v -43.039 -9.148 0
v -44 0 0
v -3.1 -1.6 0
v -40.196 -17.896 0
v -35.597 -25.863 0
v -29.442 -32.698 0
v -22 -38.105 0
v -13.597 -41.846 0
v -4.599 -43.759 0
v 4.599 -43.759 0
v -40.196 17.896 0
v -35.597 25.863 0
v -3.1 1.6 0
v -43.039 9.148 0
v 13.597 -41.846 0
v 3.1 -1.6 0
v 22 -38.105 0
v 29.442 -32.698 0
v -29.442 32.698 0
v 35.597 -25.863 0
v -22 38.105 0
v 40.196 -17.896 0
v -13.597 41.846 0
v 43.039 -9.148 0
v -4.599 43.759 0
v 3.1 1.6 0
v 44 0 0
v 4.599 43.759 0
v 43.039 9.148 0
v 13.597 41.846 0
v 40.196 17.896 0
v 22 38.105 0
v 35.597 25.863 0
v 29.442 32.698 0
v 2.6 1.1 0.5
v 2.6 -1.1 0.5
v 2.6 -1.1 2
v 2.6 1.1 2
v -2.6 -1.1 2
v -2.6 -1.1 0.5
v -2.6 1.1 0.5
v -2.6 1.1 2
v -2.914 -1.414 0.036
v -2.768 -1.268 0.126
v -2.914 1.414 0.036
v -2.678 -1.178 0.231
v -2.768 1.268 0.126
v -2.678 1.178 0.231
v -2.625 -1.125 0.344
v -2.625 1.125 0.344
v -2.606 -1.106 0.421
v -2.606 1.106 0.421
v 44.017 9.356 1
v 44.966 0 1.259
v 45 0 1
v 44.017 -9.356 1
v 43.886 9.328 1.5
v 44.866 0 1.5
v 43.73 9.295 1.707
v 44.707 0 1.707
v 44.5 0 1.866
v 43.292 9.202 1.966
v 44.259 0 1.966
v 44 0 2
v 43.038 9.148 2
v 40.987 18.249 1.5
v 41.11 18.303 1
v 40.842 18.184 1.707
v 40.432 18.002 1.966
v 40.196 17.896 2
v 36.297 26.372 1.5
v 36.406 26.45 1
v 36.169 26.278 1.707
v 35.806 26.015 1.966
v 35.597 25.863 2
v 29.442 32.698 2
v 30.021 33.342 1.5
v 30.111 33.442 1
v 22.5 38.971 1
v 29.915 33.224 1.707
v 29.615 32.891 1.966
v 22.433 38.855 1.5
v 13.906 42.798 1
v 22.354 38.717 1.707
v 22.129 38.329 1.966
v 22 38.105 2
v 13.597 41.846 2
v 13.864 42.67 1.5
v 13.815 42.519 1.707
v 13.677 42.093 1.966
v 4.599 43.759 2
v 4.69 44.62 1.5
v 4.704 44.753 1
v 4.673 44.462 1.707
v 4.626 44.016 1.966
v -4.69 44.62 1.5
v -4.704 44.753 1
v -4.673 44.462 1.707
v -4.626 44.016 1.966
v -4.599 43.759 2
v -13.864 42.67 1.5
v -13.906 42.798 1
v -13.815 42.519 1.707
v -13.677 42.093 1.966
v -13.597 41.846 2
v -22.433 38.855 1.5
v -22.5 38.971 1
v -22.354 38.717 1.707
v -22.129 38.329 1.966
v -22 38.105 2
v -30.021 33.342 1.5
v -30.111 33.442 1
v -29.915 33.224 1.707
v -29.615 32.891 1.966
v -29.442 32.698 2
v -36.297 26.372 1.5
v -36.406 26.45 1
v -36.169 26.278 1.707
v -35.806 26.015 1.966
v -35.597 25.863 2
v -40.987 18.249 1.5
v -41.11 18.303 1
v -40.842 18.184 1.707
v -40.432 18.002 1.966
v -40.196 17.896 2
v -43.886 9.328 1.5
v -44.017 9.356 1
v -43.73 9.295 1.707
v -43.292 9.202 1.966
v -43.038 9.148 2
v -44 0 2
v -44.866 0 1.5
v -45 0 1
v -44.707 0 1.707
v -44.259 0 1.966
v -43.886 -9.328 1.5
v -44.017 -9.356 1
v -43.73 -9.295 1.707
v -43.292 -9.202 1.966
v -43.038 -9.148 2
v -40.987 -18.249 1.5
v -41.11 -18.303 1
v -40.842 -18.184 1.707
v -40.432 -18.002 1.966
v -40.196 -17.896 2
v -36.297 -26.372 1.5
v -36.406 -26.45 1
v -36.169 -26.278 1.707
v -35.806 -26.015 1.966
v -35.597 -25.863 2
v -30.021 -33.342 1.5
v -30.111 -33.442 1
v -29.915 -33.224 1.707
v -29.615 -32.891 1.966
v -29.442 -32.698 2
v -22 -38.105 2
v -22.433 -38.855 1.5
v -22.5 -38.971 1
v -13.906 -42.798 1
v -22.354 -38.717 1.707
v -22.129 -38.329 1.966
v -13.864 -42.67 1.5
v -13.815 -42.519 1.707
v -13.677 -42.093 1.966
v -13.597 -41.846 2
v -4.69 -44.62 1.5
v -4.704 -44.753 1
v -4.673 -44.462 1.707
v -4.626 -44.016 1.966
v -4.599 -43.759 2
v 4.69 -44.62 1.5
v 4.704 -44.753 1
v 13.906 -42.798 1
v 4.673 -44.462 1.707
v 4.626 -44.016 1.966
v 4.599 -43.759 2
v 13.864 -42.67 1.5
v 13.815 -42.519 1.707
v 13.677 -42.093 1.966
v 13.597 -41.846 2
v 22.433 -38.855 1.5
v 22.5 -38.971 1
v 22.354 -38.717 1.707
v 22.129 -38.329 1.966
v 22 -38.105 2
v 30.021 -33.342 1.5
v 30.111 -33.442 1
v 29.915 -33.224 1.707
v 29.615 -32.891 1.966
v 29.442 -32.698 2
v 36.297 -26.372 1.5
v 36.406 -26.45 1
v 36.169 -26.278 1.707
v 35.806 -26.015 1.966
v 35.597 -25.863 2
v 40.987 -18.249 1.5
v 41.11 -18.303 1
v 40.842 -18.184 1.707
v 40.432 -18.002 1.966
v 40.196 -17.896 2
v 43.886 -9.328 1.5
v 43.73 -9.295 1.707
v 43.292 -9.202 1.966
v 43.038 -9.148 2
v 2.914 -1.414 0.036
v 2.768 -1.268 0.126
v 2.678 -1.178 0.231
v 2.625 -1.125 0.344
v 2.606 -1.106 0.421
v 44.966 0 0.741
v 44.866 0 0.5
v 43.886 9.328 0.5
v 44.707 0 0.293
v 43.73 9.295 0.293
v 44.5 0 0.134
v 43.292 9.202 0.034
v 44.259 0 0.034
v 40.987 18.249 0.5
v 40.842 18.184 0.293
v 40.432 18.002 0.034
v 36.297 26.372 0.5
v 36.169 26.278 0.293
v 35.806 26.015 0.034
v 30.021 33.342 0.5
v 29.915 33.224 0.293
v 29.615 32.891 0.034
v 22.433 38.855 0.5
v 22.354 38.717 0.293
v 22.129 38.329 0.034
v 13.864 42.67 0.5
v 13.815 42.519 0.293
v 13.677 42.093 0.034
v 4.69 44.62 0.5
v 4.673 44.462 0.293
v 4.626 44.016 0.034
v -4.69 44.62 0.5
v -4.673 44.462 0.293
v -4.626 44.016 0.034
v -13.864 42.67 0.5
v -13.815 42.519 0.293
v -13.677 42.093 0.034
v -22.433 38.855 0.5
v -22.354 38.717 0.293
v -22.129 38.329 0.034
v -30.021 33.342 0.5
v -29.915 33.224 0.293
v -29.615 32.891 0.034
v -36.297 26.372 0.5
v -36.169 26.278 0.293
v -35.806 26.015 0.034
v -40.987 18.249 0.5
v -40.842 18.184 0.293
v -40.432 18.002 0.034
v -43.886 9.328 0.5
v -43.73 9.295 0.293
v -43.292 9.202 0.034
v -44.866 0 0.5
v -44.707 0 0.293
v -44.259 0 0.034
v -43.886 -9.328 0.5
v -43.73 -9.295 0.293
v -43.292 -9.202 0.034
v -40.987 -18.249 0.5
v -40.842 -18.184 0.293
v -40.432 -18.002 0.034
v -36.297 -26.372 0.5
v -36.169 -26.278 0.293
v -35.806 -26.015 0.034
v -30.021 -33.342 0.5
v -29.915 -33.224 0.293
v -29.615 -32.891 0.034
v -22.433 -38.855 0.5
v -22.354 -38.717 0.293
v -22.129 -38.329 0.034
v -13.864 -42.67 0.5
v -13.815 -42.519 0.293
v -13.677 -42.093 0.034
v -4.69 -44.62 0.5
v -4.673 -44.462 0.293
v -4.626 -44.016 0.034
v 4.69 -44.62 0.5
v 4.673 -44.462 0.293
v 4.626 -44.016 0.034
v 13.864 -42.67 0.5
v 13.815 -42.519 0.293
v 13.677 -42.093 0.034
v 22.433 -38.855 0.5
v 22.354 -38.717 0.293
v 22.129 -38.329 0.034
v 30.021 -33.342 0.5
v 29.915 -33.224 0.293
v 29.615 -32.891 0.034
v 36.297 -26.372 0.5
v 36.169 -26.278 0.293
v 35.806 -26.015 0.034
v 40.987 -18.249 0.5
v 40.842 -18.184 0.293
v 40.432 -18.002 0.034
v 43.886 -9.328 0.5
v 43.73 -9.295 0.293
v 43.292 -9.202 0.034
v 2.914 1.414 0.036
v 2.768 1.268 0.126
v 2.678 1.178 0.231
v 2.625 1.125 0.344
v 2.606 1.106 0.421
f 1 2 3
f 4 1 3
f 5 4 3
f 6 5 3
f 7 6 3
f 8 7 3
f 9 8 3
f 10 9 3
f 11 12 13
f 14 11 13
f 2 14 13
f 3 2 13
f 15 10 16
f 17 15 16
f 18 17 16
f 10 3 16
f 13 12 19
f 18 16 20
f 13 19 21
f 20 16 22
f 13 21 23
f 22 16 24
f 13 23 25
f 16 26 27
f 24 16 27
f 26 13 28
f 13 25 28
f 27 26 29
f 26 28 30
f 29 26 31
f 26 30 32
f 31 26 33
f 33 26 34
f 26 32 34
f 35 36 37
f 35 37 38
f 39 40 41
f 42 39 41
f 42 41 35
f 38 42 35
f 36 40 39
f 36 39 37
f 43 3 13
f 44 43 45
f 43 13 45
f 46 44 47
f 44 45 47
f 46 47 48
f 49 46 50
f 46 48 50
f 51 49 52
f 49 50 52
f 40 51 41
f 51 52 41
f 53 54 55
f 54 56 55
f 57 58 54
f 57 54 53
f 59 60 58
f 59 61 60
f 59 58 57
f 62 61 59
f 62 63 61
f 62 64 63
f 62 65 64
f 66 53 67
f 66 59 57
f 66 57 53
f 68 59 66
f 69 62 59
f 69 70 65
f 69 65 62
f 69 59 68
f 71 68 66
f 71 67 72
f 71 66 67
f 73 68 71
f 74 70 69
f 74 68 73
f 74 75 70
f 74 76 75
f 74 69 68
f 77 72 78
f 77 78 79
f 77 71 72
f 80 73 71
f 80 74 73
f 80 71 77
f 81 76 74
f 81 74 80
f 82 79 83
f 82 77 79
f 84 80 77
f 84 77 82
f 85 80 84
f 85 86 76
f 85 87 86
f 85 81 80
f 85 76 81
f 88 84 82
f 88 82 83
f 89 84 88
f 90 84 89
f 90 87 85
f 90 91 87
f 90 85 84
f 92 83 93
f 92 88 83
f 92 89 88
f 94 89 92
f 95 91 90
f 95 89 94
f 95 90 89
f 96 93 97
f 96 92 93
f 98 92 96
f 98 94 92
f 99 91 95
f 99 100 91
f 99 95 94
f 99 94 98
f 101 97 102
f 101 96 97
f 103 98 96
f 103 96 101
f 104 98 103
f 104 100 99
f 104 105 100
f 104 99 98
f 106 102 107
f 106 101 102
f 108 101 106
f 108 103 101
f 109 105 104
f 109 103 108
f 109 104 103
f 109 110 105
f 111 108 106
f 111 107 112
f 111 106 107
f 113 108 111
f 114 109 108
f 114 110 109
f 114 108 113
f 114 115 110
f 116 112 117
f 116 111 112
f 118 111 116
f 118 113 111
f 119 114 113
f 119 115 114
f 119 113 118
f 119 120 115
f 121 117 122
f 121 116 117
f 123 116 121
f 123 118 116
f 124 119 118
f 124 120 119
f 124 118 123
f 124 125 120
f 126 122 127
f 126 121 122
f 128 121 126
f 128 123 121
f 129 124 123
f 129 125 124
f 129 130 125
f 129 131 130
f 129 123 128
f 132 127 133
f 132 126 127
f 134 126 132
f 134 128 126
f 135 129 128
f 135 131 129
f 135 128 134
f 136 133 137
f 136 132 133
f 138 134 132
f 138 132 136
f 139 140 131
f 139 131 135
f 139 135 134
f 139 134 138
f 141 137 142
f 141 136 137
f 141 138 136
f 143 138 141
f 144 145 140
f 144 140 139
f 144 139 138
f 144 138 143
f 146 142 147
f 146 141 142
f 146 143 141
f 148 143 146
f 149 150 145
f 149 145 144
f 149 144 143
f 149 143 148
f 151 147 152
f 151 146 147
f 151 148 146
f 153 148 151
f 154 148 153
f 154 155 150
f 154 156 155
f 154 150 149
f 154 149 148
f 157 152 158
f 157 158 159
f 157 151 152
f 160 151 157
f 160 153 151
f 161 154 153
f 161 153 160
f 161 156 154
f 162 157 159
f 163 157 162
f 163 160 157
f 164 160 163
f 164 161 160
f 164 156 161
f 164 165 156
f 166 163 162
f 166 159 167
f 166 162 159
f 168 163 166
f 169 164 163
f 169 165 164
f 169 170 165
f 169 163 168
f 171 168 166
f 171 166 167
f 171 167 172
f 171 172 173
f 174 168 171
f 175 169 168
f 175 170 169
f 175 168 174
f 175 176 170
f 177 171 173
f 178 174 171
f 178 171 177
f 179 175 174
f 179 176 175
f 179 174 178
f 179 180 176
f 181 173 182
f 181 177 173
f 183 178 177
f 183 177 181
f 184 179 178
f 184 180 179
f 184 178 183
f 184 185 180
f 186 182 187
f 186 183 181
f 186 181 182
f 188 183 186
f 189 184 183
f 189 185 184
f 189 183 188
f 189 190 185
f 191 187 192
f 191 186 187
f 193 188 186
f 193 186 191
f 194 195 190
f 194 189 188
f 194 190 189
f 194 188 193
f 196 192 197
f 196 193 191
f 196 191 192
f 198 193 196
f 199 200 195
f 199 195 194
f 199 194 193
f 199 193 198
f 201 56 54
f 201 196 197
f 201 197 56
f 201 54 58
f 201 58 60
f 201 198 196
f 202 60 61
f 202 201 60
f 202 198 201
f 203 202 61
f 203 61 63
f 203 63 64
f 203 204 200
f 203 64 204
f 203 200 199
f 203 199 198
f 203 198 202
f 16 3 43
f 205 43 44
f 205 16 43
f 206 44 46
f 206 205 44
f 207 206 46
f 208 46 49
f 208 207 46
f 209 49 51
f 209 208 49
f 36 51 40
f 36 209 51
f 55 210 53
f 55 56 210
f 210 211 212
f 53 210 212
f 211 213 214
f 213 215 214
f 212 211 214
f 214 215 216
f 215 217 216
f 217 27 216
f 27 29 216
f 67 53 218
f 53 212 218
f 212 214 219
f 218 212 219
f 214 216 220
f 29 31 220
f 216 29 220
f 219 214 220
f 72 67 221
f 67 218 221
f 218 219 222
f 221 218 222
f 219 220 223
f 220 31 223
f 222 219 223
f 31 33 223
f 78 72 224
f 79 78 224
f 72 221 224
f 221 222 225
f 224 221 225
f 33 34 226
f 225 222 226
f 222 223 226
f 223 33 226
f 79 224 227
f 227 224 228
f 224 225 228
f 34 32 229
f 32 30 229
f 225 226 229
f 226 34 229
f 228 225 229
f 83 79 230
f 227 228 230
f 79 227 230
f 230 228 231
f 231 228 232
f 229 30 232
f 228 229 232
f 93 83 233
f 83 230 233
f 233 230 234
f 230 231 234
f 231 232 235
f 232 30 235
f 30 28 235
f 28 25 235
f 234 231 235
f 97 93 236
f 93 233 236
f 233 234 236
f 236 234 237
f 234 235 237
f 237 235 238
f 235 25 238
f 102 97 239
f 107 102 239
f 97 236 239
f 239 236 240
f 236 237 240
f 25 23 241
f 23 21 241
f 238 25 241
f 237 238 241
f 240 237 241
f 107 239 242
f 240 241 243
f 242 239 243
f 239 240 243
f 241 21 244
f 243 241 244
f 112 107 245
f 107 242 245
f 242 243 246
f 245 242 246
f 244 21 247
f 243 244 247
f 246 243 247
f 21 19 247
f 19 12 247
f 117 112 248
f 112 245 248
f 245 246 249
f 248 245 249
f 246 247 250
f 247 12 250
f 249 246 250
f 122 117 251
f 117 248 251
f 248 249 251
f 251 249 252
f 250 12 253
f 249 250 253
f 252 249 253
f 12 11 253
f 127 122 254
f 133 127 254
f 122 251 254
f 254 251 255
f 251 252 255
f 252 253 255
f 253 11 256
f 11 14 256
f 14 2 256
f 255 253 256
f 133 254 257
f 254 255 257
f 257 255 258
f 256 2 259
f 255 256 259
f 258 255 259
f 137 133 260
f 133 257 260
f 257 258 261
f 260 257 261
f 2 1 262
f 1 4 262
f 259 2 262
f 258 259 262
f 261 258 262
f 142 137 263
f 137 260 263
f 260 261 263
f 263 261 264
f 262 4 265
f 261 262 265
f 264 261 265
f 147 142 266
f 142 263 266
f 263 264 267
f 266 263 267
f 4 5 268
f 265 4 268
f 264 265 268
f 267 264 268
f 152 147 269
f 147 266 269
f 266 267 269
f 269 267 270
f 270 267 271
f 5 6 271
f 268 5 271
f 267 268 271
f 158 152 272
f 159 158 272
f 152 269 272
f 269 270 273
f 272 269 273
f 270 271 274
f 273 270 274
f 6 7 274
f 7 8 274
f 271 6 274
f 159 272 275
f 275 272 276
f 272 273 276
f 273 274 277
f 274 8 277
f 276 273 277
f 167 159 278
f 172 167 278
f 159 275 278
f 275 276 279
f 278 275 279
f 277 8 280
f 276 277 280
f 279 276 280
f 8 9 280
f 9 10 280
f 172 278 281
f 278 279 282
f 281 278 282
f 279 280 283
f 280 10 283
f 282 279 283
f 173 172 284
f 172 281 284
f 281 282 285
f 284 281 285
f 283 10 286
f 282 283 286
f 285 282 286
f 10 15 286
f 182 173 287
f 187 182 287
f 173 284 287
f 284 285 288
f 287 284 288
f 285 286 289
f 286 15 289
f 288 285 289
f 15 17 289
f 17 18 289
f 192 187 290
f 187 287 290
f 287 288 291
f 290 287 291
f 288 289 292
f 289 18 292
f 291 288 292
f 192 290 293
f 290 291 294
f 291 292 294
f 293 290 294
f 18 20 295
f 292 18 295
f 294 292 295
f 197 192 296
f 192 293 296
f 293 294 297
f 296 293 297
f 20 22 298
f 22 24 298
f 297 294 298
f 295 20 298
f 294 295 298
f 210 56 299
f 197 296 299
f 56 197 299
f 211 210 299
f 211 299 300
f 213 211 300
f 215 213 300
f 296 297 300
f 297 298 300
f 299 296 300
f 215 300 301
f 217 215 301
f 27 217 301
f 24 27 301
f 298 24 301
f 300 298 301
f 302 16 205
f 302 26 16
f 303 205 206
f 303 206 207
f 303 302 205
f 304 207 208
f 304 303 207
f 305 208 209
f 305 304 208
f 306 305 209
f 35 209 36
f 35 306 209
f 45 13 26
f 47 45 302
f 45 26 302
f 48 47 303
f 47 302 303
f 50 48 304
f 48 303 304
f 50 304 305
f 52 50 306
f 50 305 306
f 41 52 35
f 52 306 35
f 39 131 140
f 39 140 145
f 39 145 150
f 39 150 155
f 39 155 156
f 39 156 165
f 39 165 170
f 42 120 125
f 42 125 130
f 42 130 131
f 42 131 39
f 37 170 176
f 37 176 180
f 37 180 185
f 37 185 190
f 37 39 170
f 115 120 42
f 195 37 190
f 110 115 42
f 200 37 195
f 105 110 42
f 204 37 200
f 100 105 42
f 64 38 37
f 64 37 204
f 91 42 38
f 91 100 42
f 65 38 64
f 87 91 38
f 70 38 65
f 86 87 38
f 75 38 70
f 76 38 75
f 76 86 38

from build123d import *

# Parameters (mm, degrees)
F0_R     = 45
F0_W     = 5.2
F0_H     = 2.2
F1_DEPTH = 2
F2_R     = 1
F3_R     = 0.99999
F4_R     = 0.5


# Not quite as in the source:
# - a fillet or chamfer is up to 0.001 mm smaller than in the source, because OpenCascade refuses the exact size


with BuildPart() as f1:
    # F0 (on Top) → F1 (new body)
    with BuildSketch(Plane.XY):
        Circle(F0_R)
        Rectangle(F0_W, F0_H, mode=Mode.SUBTRACT)
    extrude(amount=F1_DEPTH)

    # F2
    f2_edges = [f1.edges().sort_by_distance(p)[0] for p in [
        (-45, 0, 2),
    ]]
    fillet(f2_edges, radius=F2_R)

    # F3 (radius 1 in the source; OpenCascade refuses exactly that, so slightly less here)
    f3_edges = [f1.edges().sort_by_distance(p)[0] for p in [
        (-45, 0, 0),
    ]]
    fillet(f3_edges, radius=F3_R)

    # F4
    f4_edges = [f1.edges().sort_by_distance(p)[0] for p in [
        (-2.6, 0, 0),
        (0, -1.1, 0),
        (2.6, 0, 0),
        (0, 1.1, 0),
    ]]
    fillet(f4_edges, radius=F4_R)


solid = f1.part
